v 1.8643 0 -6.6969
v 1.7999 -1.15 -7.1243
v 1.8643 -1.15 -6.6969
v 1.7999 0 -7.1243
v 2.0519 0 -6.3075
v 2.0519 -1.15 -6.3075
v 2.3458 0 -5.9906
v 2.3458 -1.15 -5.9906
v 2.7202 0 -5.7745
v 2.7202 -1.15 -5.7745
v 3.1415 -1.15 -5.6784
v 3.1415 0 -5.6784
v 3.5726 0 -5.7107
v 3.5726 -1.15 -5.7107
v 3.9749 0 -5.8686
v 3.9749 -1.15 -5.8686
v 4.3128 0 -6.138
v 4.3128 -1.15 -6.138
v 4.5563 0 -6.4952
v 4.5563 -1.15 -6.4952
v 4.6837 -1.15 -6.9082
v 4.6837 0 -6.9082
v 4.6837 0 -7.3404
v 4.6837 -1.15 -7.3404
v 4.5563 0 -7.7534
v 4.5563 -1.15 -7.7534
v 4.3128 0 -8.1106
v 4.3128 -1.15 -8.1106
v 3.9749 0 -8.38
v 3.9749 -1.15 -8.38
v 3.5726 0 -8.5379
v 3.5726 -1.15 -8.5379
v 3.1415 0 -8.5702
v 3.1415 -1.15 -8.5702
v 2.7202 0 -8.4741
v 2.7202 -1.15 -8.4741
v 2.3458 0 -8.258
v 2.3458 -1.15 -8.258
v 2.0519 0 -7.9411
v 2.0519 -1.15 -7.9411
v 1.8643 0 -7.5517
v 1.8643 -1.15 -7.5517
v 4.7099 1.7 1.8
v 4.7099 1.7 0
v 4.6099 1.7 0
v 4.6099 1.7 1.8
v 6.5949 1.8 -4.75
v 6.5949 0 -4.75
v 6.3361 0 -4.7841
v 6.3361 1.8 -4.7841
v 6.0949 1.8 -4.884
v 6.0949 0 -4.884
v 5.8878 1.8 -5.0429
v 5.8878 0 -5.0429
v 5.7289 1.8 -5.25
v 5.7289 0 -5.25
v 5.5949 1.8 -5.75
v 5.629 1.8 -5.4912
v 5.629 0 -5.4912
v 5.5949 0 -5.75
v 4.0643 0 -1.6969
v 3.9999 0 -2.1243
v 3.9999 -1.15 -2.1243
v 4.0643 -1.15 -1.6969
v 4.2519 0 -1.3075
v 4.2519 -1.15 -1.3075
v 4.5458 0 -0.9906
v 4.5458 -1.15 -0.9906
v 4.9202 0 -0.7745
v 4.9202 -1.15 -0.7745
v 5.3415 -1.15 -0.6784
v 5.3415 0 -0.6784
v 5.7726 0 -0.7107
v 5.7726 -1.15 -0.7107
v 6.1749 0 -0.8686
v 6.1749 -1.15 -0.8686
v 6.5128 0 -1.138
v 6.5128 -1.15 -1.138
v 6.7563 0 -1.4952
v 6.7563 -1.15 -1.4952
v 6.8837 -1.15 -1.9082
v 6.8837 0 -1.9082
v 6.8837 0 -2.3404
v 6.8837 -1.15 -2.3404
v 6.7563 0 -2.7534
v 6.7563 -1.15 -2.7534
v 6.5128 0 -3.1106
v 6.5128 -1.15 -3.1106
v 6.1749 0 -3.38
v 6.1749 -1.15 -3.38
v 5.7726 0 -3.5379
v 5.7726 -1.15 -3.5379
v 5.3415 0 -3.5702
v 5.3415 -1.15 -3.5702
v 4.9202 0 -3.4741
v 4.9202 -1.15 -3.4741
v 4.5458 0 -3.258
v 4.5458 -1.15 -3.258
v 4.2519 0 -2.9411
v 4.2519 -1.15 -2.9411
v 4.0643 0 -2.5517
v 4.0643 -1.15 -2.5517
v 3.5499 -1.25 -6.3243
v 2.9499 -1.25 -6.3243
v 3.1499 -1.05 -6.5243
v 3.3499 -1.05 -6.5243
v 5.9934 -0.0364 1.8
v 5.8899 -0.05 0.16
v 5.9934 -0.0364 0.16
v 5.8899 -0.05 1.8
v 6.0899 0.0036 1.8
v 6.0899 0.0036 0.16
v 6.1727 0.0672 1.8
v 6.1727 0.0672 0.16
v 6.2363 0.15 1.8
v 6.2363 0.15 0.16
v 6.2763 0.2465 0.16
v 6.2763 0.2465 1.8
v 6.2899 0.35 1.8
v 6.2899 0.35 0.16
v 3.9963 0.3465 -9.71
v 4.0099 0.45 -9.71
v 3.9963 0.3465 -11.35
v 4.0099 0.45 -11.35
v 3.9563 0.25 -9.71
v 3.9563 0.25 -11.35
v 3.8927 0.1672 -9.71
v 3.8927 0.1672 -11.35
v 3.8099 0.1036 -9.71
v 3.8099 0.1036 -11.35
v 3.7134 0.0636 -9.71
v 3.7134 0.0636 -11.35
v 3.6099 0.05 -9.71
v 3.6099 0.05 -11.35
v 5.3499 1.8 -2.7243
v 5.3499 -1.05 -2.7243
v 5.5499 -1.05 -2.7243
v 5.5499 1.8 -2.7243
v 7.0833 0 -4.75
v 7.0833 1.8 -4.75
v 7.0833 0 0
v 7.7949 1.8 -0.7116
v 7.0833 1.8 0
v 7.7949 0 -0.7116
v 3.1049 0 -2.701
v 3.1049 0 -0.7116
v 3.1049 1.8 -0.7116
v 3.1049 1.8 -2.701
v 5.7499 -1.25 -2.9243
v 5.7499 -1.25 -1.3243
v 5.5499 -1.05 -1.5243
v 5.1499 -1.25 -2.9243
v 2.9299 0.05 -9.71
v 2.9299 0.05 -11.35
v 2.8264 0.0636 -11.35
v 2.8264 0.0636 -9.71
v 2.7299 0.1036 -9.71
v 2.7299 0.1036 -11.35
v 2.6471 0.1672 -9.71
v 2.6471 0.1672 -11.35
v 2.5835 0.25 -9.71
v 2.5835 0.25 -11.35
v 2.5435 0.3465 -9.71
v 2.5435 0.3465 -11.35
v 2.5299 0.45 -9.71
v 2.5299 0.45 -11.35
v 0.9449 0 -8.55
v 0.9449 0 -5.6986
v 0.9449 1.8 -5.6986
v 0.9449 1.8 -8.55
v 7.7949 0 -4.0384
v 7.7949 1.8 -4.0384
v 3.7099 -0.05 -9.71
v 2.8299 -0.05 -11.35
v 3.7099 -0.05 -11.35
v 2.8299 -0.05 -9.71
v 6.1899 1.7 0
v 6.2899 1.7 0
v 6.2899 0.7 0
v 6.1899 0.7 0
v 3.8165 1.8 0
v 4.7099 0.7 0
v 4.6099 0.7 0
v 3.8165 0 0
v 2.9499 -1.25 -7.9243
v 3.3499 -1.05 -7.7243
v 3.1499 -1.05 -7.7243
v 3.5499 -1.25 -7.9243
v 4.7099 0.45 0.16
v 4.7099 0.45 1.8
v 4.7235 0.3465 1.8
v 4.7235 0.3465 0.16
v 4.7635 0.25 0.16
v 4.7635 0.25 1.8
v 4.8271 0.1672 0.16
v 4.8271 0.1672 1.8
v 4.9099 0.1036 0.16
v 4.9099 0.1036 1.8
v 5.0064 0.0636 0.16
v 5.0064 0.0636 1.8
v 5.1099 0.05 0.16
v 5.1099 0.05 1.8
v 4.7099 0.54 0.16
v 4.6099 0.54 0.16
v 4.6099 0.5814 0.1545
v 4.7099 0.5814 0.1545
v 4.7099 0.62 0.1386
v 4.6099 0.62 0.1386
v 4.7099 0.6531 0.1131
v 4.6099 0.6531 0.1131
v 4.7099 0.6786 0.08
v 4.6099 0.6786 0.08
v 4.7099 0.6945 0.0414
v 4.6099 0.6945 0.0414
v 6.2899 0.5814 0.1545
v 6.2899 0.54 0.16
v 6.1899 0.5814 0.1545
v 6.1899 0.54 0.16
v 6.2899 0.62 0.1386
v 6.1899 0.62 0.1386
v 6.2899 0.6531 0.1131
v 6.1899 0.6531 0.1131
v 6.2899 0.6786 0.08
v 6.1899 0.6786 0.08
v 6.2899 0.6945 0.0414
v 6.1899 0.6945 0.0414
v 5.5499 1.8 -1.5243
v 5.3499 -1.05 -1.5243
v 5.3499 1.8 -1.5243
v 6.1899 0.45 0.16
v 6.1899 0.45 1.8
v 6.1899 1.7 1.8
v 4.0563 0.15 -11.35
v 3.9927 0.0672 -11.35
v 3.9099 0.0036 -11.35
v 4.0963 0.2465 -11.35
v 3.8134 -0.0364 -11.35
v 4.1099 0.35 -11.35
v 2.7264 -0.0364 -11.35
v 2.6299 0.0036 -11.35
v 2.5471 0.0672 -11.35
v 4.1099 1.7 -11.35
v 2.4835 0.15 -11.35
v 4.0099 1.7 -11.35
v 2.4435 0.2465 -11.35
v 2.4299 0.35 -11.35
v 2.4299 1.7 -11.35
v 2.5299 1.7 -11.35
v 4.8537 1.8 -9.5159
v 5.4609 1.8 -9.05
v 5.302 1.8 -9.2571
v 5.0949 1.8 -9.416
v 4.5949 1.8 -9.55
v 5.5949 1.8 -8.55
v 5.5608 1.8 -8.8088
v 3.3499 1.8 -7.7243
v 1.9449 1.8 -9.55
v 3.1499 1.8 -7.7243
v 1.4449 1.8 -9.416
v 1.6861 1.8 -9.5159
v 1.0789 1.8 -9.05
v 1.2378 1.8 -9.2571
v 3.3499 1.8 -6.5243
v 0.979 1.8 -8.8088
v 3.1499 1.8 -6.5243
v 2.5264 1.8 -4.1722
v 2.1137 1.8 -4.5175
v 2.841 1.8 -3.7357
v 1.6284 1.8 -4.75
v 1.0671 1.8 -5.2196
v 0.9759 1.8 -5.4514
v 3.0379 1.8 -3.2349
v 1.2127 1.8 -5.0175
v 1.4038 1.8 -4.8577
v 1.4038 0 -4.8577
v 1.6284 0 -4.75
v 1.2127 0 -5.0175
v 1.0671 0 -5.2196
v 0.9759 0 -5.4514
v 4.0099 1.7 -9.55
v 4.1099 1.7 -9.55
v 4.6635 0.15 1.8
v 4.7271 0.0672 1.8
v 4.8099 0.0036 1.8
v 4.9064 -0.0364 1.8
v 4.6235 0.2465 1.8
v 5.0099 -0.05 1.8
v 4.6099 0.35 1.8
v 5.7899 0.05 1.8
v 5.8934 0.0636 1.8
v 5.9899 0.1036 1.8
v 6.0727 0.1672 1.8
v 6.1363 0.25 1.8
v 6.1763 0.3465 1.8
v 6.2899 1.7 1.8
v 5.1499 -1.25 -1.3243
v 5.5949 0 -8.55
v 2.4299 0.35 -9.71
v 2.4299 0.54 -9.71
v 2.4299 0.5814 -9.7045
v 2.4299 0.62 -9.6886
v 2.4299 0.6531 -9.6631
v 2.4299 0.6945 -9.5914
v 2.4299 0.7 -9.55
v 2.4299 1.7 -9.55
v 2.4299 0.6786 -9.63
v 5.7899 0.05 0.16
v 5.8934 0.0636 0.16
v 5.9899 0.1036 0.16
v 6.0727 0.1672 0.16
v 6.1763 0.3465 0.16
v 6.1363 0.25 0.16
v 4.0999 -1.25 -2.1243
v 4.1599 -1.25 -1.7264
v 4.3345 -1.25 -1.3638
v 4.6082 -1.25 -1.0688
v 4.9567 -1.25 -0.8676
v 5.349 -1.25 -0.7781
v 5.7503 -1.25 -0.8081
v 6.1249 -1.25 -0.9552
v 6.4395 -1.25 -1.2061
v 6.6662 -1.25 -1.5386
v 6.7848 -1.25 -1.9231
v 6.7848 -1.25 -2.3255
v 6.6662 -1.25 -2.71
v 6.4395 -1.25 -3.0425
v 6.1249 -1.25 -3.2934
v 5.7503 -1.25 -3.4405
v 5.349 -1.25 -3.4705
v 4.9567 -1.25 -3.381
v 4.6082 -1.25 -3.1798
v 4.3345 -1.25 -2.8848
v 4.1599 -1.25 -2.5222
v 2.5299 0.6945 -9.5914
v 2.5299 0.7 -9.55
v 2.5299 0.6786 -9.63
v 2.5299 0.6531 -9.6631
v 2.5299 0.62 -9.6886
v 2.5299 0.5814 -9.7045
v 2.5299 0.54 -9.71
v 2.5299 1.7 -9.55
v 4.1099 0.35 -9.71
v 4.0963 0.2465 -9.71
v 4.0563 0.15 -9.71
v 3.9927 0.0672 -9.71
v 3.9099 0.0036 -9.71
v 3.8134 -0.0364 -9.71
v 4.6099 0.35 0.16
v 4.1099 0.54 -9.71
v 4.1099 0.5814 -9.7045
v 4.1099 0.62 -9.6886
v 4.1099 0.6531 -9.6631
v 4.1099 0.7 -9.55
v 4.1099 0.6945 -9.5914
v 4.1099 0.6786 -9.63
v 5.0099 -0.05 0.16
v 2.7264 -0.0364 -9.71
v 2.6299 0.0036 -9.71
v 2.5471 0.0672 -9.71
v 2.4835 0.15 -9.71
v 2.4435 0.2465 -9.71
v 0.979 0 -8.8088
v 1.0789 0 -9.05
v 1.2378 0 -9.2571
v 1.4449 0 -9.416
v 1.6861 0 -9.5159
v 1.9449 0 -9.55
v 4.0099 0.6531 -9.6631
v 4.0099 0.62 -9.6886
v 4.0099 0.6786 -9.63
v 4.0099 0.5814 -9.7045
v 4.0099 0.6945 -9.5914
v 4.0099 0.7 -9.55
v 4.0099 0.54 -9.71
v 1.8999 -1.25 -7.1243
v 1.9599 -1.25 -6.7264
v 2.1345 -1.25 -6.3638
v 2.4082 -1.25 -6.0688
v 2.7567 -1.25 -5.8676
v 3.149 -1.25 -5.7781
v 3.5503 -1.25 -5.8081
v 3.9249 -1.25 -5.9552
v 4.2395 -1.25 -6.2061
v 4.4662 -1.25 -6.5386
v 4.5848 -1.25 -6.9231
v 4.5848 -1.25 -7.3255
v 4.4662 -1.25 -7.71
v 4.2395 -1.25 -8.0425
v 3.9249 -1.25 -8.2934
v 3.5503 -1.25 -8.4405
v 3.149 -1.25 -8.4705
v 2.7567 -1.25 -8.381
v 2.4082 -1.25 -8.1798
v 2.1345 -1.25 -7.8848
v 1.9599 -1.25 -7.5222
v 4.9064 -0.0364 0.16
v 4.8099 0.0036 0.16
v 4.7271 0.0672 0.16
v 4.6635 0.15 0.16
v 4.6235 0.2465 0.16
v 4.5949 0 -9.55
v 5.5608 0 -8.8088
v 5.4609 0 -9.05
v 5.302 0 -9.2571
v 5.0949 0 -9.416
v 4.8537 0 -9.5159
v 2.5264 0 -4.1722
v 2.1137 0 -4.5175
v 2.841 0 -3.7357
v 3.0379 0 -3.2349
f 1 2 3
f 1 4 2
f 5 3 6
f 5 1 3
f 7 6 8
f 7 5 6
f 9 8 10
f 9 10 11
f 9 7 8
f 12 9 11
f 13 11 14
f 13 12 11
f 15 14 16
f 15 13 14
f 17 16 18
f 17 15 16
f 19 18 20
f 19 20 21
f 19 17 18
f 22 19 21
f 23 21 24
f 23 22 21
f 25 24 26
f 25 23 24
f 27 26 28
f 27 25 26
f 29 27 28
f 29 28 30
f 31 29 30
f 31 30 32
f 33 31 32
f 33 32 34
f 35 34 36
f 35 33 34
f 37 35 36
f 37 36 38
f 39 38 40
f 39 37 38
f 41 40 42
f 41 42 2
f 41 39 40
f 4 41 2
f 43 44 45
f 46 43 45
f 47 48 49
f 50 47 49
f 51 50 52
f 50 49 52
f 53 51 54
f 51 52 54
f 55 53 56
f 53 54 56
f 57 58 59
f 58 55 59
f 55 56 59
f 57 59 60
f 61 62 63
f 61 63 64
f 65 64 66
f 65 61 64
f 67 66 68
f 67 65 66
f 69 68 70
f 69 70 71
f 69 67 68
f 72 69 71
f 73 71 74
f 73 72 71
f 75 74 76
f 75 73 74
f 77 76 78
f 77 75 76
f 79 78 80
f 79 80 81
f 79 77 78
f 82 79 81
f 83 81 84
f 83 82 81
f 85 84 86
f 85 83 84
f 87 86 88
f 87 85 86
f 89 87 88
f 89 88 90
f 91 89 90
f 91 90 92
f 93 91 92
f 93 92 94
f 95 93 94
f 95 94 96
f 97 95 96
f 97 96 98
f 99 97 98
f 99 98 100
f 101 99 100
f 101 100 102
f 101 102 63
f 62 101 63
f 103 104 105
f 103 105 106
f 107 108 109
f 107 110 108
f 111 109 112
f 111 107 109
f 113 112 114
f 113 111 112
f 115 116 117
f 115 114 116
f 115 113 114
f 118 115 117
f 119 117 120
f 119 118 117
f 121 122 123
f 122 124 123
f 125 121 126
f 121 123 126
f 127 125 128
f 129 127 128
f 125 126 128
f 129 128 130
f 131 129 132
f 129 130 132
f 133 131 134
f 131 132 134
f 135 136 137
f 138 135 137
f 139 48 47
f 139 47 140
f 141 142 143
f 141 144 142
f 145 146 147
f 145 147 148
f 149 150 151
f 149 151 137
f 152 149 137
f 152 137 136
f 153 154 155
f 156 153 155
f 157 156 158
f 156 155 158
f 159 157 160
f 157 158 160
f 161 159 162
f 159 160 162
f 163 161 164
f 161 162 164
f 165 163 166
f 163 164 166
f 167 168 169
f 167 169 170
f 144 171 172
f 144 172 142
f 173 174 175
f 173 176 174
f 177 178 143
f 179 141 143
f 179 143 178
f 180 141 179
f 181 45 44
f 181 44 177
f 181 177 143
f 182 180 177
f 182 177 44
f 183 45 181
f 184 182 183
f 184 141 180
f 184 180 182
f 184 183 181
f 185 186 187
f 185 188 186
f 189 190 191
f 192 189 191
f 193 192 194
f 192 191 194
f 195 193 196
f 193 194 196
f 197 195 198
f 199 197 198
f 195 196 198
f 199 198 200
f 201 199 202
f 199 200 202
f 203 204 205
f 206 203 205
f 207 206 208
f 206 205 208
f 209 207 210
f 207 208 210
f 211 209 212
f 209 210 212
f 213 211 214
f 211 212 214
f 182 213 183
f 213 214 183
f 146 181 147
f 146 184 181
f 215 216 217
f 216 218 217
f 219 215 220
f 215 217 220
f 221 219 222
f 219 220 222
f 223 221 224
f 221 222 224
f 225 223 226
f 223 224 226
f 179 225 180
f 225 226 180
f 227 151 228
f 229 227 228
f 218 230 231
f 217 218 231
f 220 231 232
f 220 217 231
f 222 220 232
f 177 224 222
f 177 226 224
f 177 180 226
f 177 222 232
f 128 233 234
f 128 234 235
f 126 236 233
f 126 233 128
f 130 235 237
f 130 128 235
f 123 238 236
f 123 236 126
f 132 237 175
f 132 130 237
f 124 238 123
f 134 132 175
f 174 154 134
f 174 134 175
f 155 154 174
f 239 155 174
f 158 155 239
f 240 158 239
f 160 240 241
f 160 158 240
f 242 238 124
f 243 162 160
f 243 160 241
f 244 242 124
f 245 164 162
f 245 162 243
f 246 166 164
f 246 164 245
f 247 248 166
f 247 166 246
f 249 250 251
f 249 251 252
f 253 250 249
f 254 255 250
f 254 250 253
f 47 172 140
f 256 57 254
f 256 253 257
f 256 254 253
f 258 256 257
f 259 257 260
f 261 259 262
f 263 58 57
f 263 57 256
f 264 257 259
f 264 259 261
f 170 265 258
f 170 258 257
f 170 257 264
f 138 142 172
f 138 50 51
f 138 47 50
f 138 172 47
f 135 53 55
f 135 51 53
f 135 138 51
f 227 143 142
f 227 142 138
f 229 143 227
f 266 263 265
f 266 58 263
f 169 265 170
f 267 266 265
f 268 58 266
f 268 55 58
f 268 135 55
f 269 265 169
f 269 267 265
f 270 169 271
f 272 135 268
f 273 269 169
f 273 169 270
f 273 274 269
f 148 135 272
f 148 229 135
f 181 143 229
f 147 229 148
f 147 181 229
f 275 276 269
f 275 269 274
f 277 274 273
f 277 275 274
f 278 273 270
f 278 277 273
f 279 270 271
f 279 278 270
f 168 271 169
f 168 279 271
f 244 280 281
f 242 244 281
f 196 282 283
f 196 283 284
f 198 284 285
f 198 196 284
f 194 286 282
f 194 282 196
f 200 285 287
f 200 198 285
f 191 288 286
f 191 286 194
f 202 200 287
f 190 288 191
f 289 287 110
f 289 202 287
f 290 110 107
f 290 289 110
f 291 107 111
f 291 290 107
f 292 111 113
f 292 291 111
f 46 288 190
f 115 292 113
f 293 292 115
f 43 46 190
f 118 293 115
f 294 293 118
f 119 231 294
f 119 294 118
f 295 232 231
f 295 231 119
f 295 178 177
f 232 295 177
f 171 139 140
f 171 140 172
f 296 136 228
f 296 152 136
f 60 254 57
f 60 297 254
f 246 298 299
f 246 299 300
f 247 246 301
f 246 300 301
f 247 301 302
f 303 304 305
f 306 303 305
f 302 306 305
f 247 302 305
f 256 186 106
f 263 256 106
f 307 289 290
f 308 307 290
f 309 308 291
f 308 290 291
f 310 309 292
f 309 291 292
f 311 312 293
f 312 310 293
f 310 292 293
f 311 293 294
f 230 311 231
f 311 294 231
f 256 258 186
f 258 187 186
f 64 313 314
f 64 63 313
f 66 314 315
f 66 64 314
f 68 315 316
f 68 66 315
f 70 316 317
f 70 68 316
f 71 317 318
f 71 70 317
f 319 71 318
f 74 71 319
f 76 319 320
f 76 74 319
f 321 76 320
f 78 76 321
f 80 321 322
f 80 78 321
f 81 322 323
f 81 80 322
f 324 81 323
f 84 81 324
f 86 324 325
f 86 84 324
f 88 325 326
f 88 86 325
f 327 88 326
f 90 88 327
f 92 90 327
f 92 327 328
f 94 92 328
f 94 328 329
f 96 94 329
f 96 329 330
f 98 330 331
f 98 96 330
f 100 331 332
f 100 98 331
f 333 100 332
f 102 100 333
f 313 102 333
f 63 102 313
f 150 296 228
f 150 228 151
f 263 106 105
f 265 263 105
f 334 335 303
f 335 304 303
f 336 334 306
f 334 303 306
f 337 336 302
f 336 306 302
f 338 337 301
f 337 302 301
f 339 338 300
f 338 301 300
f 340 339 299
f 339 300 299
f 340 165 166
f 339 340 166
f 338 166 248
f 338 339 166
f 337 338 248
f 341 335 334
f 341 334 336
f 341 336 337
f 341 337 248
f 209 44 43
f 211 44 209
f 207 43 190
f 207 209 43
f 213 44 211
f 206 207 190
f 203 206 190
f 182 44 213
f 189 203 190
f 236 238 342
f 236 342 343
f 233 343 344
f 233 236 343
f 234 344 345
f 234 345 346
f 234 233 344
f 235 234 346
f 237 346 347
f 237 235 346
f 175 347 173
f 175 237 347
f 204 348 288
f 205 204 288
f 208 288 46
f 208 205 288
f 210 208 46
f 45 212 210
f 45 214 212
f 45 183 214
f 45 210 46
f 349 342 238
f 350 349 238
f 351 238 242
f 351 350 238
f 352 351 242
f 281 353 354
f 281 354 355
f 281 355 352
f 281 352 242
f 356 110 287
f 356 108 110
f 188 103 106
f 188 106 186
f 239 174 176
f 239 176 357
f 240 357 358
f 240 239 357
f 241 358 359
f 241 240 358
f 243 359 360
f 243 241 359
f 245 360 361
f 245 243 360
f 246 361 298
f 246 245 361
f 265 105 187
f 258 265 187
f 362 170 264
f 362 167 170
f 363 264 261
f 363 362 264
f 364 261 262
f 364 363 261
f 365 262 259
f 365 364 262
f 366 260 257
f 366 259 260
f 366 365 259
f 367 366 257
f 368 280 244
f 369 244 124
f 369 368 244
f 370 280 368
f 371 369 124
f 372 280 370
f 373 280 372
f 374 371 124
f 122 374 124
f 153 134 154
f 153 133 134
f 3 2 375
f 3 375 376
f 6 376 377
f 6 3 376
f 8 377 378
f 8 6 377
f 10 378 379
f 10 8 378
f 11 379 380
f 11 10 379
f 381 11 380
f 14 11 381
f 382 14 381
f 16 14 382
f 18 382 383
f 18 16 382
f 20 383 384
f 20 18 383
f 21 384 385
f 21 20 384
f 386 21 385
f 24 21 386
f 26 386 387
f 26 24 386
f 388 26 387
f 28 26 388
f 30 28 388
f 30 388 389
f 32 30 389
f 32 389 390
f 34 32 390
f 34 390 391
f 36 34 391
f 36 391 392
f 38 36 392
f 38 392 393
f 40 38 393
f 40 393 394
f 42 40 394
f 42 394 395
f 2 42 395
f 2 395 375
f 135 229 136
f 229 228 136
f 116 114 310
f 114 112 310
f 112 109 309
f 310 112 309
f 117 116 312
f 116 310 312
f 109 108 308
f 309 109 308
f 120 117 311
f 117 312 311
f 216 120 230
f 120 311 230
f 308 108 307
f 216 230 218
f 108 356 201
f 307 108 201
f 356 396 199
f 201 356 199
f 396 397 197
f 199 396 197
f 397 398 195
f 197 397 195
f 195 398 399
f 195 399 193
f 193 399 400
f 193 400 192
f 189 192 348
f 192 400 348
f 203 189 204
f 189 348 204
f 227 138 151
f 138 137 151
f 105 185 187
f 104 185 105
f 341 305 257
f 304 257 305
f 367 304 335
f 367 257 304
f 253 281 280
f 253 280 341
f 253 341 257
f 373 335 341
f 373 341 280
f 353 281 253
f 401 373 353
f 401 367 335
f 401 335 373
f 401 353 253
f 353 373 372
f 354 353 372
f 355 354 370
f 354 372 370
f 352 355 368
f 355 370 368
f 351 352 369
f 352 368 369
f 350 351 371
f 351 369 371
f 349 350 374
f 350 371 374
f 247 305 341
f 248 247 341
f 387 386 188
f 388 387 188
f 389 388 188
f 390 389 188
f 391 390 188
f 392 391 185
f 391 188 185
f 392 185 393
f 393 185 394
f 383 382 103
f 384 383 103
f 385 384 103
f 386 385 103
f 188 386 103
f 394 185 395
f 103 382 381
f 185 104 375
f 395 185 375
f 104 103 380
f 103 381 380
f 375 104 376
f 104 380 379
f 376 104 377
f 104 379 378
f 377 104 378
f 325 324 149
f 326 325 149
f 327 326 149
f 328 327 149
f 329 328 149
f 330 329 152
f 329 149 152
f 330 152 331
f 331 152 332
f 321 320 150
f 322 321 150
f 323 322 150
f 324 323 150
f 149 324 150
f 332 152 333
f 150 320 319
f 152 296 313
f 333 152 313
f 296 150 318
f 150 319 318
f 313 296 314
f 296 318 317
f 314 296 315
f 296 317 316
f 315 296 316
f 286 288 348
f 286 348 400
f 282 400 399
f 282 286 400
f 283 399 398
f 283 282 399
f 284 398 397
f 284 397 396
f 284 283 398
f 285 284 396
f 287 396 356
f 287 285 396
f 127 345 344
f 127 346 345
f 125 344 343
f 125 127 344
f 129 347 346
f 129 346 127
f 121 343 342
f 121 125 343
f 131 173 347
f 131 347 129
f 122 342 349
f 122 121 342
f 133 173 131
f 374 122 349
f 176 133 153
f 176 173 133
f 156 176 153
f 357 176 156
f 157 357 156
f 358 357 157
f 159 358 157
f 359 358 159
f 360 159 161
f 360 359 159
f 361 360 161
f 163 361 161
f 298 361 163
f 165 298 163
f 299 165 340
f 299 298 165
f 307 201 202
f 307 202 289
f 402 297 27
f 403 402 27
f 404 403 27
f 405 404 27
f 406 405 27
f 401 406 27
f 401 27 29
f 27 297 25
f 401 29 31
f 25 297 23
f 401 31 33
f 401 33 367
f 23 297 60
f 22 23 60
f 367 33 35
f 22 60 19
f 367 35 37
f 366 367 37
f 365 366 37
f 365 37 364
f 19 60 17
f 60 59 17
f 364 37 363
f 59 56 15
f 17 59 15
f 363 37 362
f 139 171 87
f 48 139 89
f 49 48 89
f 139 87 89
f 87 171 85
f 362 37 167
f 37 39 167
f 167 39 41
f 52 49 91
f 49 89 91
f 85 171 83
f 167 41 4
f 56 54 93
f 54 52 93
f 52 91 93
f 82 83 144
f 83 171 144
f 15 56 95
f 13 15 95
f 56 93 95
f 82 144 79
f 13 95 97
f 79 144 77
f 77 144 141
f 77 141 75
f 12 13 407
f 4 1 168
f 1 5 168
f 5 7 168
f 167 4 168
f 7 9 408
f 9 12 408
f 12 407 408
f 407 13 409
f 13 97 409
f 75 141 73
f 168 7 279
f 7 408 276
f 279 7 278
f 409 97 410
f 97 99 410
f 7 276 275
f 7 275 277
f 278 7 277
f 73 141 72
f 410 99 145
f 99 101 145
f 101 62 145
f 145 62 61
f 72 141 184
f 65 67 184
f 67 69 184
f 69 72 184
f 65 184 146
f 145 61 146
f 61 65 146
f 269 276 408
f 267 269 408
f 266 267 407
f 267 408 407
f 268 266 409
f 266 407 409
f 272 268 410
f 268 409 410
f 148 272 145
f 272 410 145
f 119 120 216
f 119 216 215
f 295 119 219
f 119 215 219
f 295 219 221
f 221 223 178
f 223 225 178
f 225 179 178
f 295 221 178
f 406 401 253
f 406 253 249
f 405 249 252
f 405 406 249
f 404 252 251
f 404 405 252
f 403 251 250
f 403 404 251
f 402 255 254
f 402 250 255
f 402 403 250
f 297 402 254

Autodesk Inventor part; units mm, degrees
ref_plane "YZ Plane" through (0, 0, 0) normal (1, 0, 0) x (0, 1, 0)
ref_plane "XZ Plane" through (0, 0, 0) normal (0, 1, 0) x (-1, 0, 0)
ref_plane "XY Plane" through (0, 0, 0) normal (0, 0, 1) x (1, 0, 0)
sketch "Sketch1" plane through (0, 0, 0) normal (0, 1, 0) x (-1, 0, 0)
  line L0 (0, 0) -> (-3.8165, 0)
  line L1 (-3.8165, 0) -> (-3.1049, -0.7116)
  line L2 (-3.1049, -0.7116) -> (-3.1049, -2.701)
  arc A0 (-3.1049, -2.701) -> (-1.6284, -4.75) centre (-0.9449, -2.701) ccw
  line L3 (-0.9449, -5.6986) -> (-0.9449, -8.55)
  line L4 (-1.9449, -9.55) -> (-4.5949, -9.55)
  line L5 (-5.5949, -8.55) -> (-5.5949, -5.75)
  line L6 (-6.5949, -4.75) -> (-7.0833, -4.75)
  line L7 (-7.0833, -4.75) -> (-7.7949, -4.0384)
  line L8 (-7.7949, -4.0384) -> (-7.7949, -0.7116)
  line L9 (-7.7949, -0.7116) -> (-7.0833, 0)
  line L10 (-7.0833, 0) -> (-3.8165, 0)
  circle A1 centre (-5.4499, -2.1243) radius 1.45
  circle A2 centre (-3.2499, -7.1243) radius 1.45
  arc A3 (-0.9449, -5.6986) -> (-1.6284, -4.75) centre (-1.9449, -5.6986) ccw
  arc A4 (-5.5949, -5.75) -> (-6.5949, -4.75) centre (-6.5949, -5.75) ccw
  arc A5 (-1.9449, -9.55) -> (-0.9449, -8.55) centre (-1.9449, -8.55) ccw
  arc A6 (-5.5949, -8.55) -> (-4.5949, -9.55) centre (-4.5949, -8.55) ccw
  point P0 (-0.9449, -4.861)
  point P1 (-5.5949, -7.15)
  point P2 (-5.4499, 0)
  point P3 (-6.8391, -4.75)
  point P4 (-0.9449, -7.1243)
  dimension "d0" = 5
  dimension "d1" = 2.2
  dimension "d2" = 2.9
  dimension "d3" = 4.75
  dimension "d4" = 4.65
  dimension "d6" = 4.69
  dimension "d8" = 6.85
  dimension "d9" = 9.55
  dimension "d10" = 135
  dimension "d11" = 135
  dimension "d12" = 135
  dimension "d13" = 1
  dimension "d14" = 1
extrude "Extrusion1" add sketch "Sketch1" along normal blind 1.8 contours L1 L2 A0 A3 L3 A5 L4 A6 L5 A4 L6 L7 L8 L9 L10 | A1 | A2
extrude "Extrusion2" add sketch "Sketch1" against normal blind 1.25 contours A1 | A2
chamfer "Chamfer1" distance 0.1 angle 45 2 edges at (6.8999, -1.25, -2.1243) (4.6999, -1.25, -7.1243)
sketch "Sketch2" plane through (3.8165, 0, 0) normal (0, 0, 1) x (1, 0, 0)
  line L0 (1.7784, 1.8) -> (2.7784, 1.8) projected
  line L1 (2.4734, -0.05) -> (0.7934, -0.05)
  line L2 (0.7784, 0) -> (0.7784, 1.8) projected
  line L3 (3.2668, 0) -> (3.2668, 1.8) projected
  line L4 (0, 0) -> (0, 1.8) projected
  line L5 (0, 1.8) -> (3.2668, 1.8) projected
  line L6 (2.4734, -0.05) -> (2.4734, 1.7)
  line L7 (0.7934, -0.05) -> (0.7934, 1.7)
  line L8 (0.8934, 1.7) -> (0.8934, 0.05)
  line L9 (0.8934, 0.05) -> (2.3734, 0.05)
  line L10 (2.3734, 0.05) -> (2.3734, 1.7)
  line L11 (2.4734, 1.7) -> (2.3734, 1.7)
  line L12 (0.8934, 1.7) -> (0.7934, 1.7)
  point P0 (-3.8165, 0)
  dimension "d24" = 1.68
  dimension "d26" = 1.85
  dimension "d27" = 0.1
  dimension "d28" = 0.7934
  dimension "d29" = 0.7934
  dimension "d30" = 0.1
  dimension "d31" = 0.1
extrude "Extrusion3" add sketch "Sketch2" along normal blind 1.8
sketch "Sketch3" plane through (4.6099, 0, 0) normal (-1, 0, 0) x (0, 0, 1)
  line L0 (0, -0.05) -> (1.8, -0.05) projected
  line L1 (0.16, -0.05) -> (0.16, 0.54)
  line L2 (0, 0) -> (0, 1.7) projected
  arc A0 (0.16, 0.54) -> (0, 0.7) centre (0, 0.54) ccw
  line L3 (0, 0) -> (0, 1.8) projected
  line L4 (0, 0) -> (0, 1.7) projected
  line L5 (0, 0) -> (0, -0.05) projected
  line L6 (0, -0.05) -> (1.8, -0.05) projected
  line L7 (1.8, 1.7) -> (1.8, -0.05) projected
  line L8 (0, 1.7) -> (1.8, 1.7) projected
  point P0 (0, 0)
  dimension "d34" = 0.16
  dimension "d54" = 0.75
extrude "Extrusion4" cut sketch "Sketch3" against normal through all contours L5 L2 A0 L1 L0
sketch "Sketch4" plane through (4.5949, 0, -9.55) normal (0, 0, -1) x (-1, 0, 0)
  line L0 (2.165, -0.05) -> (0.485, -0.05)
  line L1 (2.165, -0.05) -> (2.165, 1.7)
  line L2 (0.485, -0.05) -> (0.485, 1.7)
  line L3 (0.585, 1.7) -> (0.585, 0.05)
  line L4 (0.585, 0.05) -> (2.065, 0.05)
  line L5 (2.065, 0.05) -> (2.065, 1.7)
  line L6 (2.165, 1.7) -> (2.065, 1.7)
  line L7 (0.585, 1.7) -> (0.485, 1.7)
  line L8 (2.65, 0) -> (2.65, 1.8) projected
  line L9 (0, 1.8) -> (2.65, 1.8) projected
  line L10 (0, 0) -> (0, 1.8) projected
  point P0 (4.5949, 0)
  dimension "d37" = 1.68
  dimension "d42" = 0.1
  dimension "d43" = 0.1
  dimension "d44" = 0.485
  dimension "d45" = 0.485
  dimension "d46" = 1.85
  dimension "d47" = 0.1
extrude "Extrusion5" add sketch "Sketch4" along normal blind 1.8
sketch "Sketch5" plane through (2.4299, 0, -9.55) normal (-1, 0, 0) x (0, 0, 1)
  line L0 (0, -0.05) -> (0, 0) projected
  line L1 (0, 1.7) -> (0, 0) projected
  line L2 (0, 1.7) -> (-1.8, 1.7) projected
  line L3 (-1.8, -0.05) -> (-1.8, 1.7) projected
  line L4 (0, -0.05) -> (-1.8, -0.05) projected
  line L5 (-0.16, -0.05) -> (-0.16, 0.54)
  arc A0 (0, 0.7) -> (-0.16, 0.54) centre (0, 0.54) ccw
  point P0 (9.55, 0)
  point P1 (-1.867, -0.613)
  point P2 (-1.867, -0.6608)
  point P3 (0, -0.025)
  dimension "d51" = 0.16
  dimension "d55" = 0.75
extrude "Extrusion6" cut sketch "Sketch5" against normal through all contours L4 L5 A0 L1 L0
sketch "Sketch6" plane through (5.4499, -1.25, -2.1243) normal (0, -1, 0) x (1, 0, 0)
  line L0 (0.1, 0.6) -> (-0.1, 0.6)
  line L1 (-0.1, 0.6) -> (-0.1, -0.6)
  line L2 (-0.1, -0.6) -> (0.1, -0.6)
  line L3 (0.1, -0.6) -> (0.1, 0.6)
  line L4 (-2.1, -4.4) -> (-2.3, -4.4)
  line L5 (-2.3, -4.4) -> (-2.3, -5.6)
  line L6 (-2.3, -5.6) -> (-2.1, -5.6)
  line L7 (-2.1, -5.6) -> (-2.1, -4.4)
  circle A0 centre (0, 0) radius 1.35 projected
  circle A1 centre (-2.2, -5) radius 1.35 projected
  point P0 (-5.4499, 2.1243)
  point P1 (0.1, 0)
  point P2 (0, 0.6)
  point P3 (-2.1, -5)
  point P4 (-2.2, -4.4)
  dimension "d56" = 1.2
  dimension "d57" = 0.2
  dimension "d58" = 1.2
  dimension "d59" = 0.2
extrude "Extrusion7" cut sketch "Sketch6" against normal through all contours L3 L2 L1 L0 | L7 L6 L5 L4
chamfer "Chamfer2" distance 0.2 angle 45 8 edges at (5.5499, -1.25, -2.1243) (5.4499, -1.25, -1.5243) (5.3499, -1.25, -2.1243) (5.4499, -1.25, -2.7243) (3.3499, -1.25, -7.1243) (3.2499, -1.25, -6.5243) (3.1499, -1.25, -7.1243) (3.2499, -1.25, -7.7243)
fillet "Fillet1" radius 0.4 8 edges at (4.6099, -0.05, 0.98) (6.2899, -0.05, 0.98) (6.1899, 0.05, 0.98) (4.7099, 0.05, 0.98) (2.4299, -0.05, -10.53) (4.1099, -0.05, -10.53) (4.0099, 0.05, -10.53) (2.5299, 0.05, -10.53)
equation "\"d11\" = d10"
equation "\"d29\" = d28"
properties part number "Kailh Choc Hotswap Socket Negative"
